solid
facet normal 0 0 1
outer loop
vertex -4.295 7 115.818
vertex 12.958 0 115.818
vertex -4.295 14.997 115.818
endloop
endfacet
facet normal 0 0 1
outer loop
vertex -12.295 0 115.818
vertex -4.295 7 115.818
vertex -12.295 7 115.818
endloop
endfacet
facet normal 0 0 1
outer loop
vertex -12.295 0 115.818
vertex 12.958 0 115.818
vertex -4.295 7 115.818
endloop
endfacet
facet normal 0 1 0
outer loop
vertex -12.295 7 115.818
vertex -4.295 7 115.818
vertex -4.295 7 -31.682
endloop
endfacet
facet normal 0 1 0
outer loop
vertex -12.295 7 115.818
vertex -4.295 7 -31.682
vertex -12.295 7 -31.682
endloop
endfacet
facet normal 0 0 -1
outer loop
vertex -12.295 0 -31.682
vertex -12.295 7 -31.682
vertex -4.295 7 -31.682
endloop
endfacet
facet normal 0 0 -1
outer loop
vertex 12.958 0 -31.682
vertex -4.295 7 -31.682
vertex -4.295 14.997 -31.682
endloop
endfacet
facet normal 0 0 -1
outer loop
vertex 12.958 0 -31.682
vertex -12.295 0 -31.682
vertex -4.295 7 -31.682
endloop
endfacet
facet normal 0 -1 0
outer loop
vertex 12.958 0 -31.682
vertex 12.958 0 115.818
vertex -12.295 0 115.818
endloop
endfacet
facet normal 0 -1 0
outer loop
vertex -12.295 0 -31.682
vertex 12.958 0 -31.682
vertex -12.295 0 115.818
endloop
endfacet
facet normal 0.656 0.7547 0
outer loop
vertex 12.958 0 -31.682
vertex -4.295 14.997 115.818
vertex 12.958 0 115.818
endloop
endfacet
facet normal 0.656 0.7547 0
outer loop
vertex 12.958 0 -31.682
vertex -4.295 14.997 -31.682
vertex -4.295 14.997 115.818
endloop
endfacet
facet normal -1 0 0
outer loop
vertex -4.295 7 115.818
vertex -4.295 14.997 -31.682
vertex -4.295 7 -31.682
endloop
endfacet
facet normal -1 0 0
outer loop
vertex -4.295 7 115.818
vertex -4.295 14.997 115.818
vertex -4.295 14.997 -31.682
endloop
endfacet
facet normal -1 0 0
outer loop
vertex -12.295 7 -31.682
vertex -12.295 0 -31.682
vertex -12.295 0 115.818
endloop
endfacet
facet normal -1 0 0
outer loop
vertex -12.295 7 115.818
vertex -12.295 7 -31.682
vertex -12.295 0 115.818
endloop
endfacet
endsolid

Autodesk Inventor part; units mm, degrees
ref_plane "YZ Plane" through (0, 0, 0) normal (1, 0, 0) x (0, 1, 0)
ref_plane "XZ Plane" through (0, 0, 0) normal (0, 1, 0) x (-1, 0, 0)
ref_plane "XY Plane" through (0, 0, 0) normal (0, 0, 1) x (1, 0, 0)
sketch "Sketch1" plane through (0, 0, 0) normal (0, 1, 0) x (-1, 0, 0)
  line L0 (12.2947, 115.8176) -> (-13.1053, 115.8176)
  line L1 (-13.1053, 115.8176) -> (-13.1053, -31.6824)
  line L2 (-13.1053, -31.6824) -> (12.2947, -31.6824)
  line L3 (12.2947, -31.6824) -> (12.2947, 115.8176)
  point P0 (0, 0)
  dimension "d0" = 25.4
  dimension "d1" = 147.5
extrude "Extrusion1" add sketch "Sketch1" along normal blind 15
sketch "Sketch2" plane through (-12.2947, 0, 115.8176) normal (0, 0, 1) x (1, 0, 0)
  line L0 (0, 15) -> (8, 15)
  line L1 (8, 15) -> (8, 7)
  line L2 (8, 7) -> (0, 7)
  line L3 (0, 7) -> (0, 15)
  point P0 (12.2947, 0)
  dimension "d13" = 8
extrude "Extrusion2" cut sketch "Sketch2" against normal through all
ref_plane "Work Plane1" through (-4.2947, 15, 78.9426) normal (0.6561, 0.7547, 0) x (0, 0, 1)
sketch "Sketch3" plane through (-4.2947, 15, 78.9426) normal (0.6561, 0.7547, 0) x (0, 0, 1)
  line L0 (36.875, 0) -> (36.875, 13.1319) construction
  line L1 (-110.625, 22.9728) -> (-110.625, 3.8032) construction
  line L2 (36.875, 0) -> (-110.625, 0)
  line L3 (-110.625, 0) -> (-110.625, 22.9728)
  line L4 (-110.625, 22.9728) -> (36.875, 22.9728)
  line L5 (36.875, 22.9728) -> (36.875, 0)
  point P0 (-78.9426, 13.0821)
extrude "Extrusion3" add sketch "Sketch3" along normal blind 15
sketch "Sketch4" plane through (5.5462, 26.3206, 78.9426) normal (0.6561, 0.7547, 0) x (0.7547, -0.6561, 0)
  line L0 (22.8638, 110.625) -> (22.8638, -36.875) construction
  line L1 (0, -36.875) -> (22.8638, -36.875)
  line L2 (-1.723, -37.6113) -> (24.2555, -37.6113)
  line L3 (24.2555, -37.6113) -> (24.2555, 112.242)
  line L4 (24.2555, 112.242) -> (-1.723, 112.242)
  line L5 (-1.723, 112.242) -> (-1.723, -37.6113)
extrude "Extrusion4" cut sketch "Sketch4" against normal blind 15
ref_plane "Work Plane2" through (-12.2947, 7, 42.0676) normal (-0.5, -0.866, 0) x (0, 0, -1)
sketch "Sketch5" plane through (-12.2947, 7, 42.0676) normal (-0.5, -0.866, 0) x (0, 0, -1)
  point P0 (42.0676, 14.1475)
properties part number "Ramp version 2 {needs editing}"
